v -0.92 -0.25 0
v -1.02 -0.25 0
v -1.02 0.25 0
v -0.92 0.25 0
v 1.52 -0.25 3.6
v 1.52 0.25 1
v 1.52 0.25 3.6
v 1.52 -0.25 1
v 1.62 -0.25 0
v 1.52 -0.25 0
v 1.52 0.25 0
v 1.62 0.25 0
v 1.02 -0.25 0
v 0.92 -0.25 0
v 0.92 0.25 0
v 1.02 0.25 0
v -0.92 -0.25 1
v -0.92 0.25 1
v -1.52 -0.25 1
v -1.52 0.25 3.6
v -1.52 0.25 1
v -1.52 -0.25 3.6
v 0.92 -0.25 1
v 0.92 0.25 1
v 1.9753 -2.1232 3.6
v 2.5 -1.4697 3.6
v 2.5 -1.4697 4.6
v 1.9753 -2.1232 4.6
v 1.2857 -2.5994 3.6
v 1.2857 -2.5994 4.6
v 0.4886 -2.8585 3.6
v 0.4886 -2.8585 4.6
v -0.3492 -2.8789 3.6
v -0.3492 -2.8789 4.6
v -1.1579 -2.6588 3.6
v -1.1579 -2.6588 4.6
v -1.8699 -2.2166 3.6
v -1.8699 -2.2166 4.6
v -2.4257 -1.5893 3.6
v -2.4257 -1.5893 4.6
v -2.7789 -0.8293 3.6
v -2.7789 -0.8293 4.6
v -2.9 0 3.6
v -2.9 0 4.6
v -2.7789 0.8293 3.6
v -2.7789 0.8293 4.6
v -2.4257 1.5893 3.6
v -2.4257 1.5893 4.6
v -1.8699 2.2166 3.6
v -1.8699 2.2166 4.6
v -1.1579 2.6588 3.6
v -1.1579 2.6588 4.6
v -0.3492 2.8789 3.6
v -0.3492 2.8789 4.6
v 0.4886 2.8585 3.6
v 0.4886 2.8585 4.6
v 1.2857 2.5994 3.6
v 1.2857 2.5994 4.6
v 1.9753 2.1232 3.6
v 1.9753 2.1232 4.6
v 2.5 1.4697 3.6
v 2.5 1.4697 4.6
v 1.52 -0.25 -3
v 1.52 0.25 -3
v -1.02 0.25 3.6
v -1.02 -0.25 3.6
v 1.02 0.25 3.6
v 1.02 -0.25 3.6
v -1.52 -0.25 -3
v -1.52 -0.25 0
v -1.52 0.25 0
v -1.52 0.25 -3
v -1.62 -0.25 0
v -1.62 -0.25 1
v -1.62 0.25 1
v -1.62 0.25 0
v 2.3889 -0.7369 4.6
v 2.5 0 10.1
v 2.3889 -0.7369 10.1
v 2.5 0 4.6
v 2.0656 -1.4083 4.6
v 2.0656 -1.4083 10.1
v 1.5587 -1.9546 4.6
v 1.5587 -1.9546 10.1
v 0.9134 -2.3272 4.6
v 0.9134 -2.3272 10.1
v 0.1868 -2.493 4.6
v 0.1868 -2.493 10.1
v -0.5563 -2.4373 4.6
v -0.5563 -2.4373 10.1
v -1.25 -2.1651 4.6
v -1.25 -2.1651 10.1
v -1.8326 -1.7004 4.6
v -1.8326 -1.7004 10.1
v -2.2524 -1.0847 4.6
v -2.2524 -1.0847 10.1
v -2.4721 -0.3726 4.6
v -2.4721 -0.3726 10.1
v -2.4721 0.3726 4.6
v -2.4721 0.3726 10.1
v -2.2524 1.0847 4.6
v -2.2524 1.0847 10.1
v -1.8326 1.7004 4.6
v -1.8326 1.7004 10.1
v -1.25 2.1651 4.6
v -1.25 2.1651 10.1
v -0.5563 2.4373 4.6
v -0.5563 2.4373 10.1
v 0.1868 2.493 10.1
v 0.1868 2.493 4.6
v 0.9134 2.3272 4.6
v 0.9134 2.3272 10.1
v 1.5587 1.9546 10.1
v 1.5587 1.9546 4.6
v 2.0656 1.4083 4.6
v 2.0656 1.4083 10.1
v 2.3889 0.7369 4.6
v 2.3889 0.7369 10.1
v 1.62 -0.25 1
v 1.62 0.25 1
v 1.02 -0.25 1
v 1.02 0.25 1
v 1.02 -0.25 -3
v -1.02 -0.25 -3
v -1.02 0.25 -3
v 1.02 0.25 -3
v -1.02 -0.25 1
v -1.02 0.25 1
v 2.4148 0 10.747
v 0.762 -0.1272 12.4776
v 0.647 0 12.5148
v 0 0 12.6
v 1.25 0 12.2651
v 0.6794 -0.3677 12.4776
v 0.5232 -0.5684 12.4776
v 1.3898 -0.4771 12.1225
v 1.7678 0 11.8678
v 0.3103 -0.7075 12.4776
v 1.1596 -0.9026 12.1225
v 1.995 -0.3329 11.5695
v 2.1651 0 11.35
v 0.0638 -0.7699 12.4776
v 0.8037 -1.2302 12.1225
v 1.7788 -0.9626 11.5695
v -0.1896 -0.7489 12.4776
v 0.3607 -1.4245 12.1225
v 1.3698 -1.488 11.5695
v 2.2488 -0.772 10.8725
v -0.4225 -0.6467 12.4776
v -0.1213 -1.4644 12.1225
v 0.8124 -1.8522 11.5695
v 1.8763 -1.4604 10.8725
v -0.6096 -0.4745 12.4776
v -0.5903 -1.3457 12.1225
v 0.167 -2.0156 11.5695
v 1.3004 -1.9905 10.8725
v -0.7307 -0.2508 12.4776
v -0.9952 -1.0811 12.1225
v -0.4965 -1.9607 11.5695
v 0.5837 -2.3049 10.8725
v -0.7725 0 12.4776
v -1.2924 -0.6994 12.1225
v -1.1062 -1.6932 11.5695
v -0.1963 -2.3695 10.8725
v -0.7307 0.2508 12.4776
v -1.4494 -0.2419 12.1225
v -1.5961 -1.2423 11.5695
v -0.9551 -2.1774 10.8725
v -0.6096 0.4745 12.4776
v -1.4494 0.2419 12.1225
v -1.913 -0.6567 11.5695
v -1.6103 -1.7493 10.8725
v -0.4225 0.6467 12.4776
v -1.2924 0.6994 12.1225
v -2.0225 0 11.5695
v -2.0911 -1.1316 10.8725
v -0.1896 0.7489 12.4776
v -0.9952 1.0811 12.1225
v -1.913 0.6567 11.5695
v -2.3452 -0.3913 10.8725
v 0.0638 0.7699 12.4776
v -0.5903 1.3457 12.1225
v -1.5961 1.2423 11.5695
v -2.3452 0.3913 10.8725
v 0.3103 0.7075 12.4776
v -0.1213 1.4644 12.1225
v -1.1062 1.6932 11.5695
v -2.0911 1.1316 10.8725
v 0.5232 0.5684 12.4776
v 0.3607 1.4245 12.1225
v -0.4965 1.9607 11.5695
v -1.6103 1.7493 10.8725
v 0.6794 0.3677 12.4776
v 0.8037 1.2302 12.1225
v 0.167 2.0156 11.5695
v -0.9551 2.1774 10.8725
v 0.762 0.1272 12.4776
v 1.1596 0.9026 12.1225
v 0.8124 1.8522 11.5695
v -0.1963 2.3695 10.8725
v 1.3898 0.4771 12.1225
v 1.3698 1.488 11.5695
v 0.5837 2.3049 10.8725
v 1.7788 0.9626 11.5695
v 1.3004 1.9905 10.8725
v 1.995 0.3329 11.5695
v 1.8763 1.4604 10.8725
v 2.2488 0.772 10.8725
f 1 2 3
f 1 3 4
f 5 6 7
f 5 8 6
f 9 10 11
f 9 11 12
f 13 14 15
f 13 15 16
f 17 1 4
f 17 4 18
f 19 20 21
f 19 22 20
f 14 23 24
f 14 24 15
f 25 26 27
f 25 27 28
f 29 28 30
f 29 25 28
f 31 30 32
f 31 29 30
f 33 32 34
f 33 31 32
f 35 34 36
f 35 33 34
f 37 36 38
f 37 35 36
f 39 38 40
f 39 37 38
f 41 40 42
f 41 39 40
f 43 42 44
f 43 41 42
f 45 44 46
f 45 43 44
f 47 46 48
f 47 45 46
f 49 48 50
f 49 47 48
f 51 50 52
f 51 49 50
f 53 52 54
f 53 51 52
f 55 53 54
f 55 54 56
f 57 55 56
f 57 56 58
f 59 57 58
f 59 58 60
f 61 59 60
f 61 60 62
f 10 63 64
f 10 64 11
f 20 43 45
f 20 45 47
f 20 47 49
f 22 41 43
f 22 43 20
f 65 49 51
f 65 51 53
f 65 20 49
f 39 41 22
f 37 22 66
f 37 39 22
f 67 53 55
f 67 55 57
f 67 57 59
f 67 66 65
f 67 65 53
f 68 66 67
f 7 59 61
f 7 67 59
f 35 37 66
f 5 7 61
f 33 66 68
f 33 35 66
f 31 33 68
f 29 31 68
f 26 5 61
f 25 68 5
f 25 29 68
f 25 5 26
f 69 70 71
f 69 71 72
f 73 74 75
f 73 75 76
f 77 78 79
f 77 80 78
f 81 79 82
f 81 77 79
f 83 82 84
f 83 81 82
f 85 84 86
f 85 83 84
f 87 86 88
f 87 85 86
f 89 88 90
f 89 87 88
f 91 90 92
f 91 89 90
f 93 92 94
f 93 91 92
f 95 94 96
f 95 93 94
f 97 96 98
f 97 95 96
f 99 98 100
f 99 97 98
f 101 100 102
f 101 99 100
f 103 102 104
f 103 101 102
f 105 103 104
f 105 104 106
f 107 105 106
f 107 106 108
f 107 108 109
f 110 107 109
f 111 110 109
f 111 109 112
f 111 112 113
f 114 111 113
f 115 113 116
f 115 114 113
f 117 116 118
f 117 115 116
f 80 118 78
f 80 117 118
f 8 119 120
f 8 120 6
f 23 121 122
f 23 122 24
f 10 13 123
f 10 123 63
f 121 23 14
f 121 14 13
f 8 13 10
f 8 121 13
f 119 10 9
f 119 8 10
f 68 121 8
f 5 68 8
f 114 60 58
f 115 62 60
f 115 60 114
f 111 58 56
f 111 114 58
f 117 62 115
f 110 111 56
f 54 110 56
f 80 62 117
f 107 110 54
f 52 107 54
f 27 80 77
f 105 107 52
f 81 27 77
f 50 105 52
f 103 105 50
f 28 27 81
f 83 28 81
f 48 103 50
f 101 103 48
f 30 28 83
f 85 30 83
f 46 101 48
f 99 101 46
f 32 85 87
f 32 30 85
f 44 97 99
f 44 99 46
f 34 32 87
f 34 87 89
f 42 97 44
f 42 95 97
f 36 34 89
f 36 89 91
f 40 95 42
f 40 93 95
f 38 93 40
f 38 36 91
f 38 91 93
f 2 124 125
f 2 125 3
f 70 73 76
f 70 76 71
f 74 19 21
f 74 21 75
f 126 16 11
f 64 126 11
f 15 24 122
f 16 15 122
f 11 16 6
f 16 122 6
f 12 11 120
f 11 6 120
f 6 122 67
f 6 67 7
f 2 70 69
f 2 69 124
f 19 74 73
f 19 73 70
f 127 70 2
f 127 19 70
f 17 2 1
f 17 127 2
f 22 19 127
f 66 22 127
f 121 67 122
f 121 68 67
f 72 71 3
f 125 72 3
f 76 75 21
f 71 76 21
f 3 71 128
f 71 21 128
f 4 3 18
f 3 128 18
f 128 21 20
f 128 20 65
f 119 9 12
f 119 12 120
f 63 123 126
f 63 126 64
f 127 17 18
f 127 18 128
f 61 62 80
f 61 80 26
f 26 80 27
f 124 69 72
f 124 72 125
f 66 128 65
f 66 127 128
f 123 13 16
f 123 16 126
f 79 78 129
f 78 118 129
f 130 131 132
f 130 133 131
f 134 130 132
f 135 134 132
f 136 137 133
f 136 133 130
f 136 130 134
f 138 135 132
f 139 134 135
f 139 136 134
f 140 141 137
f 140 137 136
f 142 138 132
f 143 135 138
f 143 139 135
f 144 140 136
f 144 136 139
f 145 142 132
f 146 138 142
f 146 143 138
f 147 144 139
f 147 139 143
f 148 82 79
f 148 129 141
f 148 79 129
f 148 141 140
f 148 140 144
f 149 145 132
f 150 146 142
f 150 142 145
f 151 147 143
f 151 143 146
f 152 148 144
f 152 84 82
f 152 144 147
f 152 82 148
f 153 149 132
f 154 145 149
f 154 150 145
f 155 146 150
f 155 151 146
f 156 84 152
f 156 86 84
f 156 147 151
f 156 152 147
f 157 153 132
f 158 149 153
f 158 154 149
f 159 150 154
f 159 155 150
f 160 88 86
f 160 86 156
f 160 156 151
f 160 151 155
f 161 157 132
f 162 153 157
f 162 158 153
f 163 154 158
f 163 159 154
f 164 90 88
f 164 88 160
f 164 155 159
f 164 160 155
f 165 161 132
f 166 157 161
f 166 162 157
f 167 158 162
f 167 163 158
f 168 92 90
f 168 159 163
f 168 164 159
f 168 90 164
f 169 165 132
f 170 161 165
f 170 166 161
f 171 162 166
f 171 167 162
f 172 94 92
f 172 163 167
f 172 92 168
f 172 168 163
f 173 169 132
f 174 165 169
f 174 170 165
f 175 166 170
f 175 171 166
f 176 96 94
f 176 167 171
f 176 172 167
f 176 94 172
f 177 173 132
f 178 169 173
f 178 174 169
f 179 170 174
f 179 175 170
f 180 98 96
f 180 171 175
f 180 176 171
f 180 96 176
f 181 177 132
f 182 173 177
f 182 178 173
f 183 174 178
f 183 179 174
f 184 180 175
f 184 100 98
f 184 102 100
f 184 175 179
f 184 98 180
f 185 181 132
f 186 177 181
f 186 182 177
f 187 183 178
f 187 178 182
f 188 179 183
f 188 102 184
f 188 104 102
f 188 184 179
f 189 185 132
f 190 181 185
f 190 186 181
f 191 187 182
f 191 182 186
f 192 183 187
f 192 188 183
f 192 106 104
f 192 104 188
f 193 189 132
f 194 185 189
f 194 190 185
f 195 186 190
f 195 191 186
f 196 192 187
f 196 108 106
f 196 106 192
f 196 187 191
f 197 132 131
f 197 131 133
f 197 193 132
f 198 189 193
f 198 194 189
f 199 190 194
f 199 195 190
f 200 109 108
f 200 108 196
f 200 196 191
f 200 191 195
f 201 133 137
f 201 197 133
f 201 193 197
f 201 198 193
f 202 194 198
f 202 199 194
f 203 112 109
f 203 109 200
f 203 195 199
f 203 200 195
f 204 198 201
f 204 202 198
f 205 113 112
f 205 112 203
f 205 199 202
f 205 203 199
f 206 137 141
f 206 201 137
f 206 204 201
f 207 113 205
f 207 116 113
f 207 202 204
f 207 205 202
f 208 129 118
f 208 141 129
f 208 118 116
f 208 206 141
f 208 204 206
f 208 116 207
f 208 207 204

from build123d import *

# Parameters (mm, degrees)
EXTRUDE_1_DEPTH     = 0.25
EXTRUDE_1_2_DEPTH   = 0.25
CUT_EXTRUDE_1_REACH = 10.99


with BuildPart() as part:
    # Эскиз1 → Бобышка-Вытянуть1 (new, symmetric)
    with BuildSketch(Plane.XZ):
        Polygon((-1.52, 3.6), (-1.52, 1), (-1.62, 1), (-1.62, 0), (-1.52, 0), (-1.52, -3), (-1.02, -3), (-1.02, 0), (-0.92, 0), (-0.92, 1), (-1.02, 1), (-1.02, 3.6), align=None)
    extrude(amount=EXTRUDE_1_DEPTH, both=True)



with BuildPart() as body_2:
    # Эскиз1 → Extrude 1 2 (new, symmetric)
    with BuildSketch(Plane.XZ):
        Polygon((1.02, 3.6), (1.02, 1), (0.92, 1), (0.92, 0), (1.02, 0), (1.02, -3), (1.52, -3), (1.52, 0), (1.62, 0), (1.62, 1), (1.52, 1), (1.52, 3.6), align=None)
    extrude(amount=EXTRUDE_1_2_DEPTH, both=True)


with BuildPart() as part_1:
    add(part.part)

    add(body_2.part)  # Повернуть1 merges body 2
    # Эскиз2 → Повернуть1 (revolve)
    with BuildSketch(Plane(origin=(0, 0, 0), x_dir=(1, 0, 0), z_dir=(0, 1, 0))):
        with BuildLine():
            Line((0, -3.6), (0, -12.6))
            ThreePointArc((0, -12.6), (1.767766953, -11.867766953), (2.5, -10.1))
            Line((2.5, -10.1), (2.5, -4.6))
            Line((2.5, -4.6), (2.9, -4.6))
            Line((2.9, -4.6), (2.9, -3.6))
            Line((2.9, -3.6), (0, -3.6))
        make_face()
    revolve(axis=Axis((0, 0, 3.6), (0, 0, -1)))

    # Эскиз3 → Вырез-Вытянуть1 (cut, up to next)
    with BuildSketch(Plane.XY.offset(4.6), mode=Mode.PRIVATE) as cut_extrude_1_sk1:
        with BuildLine():
            Line((2.5, 1.469693846), (2.5, -1.469693846))
            ThreePointArc((2.5, -1.469693846), (2.9, 0), (2.5, 1.469693846))
        make_face()
    cut_extrude_1_tool1 = extrude(cut_extrude_1_sk1.sketch, amount=-CUT_EXTRUDE_1_REACH, mode=Mode.PRIVATE) & part_1.part
    add(cut_extrude_1_tool1.solids().sort_by_distance((2.660985, 0, 4.6))[0], mode=Mode.SUBTRACT)


solid = part_1.part
